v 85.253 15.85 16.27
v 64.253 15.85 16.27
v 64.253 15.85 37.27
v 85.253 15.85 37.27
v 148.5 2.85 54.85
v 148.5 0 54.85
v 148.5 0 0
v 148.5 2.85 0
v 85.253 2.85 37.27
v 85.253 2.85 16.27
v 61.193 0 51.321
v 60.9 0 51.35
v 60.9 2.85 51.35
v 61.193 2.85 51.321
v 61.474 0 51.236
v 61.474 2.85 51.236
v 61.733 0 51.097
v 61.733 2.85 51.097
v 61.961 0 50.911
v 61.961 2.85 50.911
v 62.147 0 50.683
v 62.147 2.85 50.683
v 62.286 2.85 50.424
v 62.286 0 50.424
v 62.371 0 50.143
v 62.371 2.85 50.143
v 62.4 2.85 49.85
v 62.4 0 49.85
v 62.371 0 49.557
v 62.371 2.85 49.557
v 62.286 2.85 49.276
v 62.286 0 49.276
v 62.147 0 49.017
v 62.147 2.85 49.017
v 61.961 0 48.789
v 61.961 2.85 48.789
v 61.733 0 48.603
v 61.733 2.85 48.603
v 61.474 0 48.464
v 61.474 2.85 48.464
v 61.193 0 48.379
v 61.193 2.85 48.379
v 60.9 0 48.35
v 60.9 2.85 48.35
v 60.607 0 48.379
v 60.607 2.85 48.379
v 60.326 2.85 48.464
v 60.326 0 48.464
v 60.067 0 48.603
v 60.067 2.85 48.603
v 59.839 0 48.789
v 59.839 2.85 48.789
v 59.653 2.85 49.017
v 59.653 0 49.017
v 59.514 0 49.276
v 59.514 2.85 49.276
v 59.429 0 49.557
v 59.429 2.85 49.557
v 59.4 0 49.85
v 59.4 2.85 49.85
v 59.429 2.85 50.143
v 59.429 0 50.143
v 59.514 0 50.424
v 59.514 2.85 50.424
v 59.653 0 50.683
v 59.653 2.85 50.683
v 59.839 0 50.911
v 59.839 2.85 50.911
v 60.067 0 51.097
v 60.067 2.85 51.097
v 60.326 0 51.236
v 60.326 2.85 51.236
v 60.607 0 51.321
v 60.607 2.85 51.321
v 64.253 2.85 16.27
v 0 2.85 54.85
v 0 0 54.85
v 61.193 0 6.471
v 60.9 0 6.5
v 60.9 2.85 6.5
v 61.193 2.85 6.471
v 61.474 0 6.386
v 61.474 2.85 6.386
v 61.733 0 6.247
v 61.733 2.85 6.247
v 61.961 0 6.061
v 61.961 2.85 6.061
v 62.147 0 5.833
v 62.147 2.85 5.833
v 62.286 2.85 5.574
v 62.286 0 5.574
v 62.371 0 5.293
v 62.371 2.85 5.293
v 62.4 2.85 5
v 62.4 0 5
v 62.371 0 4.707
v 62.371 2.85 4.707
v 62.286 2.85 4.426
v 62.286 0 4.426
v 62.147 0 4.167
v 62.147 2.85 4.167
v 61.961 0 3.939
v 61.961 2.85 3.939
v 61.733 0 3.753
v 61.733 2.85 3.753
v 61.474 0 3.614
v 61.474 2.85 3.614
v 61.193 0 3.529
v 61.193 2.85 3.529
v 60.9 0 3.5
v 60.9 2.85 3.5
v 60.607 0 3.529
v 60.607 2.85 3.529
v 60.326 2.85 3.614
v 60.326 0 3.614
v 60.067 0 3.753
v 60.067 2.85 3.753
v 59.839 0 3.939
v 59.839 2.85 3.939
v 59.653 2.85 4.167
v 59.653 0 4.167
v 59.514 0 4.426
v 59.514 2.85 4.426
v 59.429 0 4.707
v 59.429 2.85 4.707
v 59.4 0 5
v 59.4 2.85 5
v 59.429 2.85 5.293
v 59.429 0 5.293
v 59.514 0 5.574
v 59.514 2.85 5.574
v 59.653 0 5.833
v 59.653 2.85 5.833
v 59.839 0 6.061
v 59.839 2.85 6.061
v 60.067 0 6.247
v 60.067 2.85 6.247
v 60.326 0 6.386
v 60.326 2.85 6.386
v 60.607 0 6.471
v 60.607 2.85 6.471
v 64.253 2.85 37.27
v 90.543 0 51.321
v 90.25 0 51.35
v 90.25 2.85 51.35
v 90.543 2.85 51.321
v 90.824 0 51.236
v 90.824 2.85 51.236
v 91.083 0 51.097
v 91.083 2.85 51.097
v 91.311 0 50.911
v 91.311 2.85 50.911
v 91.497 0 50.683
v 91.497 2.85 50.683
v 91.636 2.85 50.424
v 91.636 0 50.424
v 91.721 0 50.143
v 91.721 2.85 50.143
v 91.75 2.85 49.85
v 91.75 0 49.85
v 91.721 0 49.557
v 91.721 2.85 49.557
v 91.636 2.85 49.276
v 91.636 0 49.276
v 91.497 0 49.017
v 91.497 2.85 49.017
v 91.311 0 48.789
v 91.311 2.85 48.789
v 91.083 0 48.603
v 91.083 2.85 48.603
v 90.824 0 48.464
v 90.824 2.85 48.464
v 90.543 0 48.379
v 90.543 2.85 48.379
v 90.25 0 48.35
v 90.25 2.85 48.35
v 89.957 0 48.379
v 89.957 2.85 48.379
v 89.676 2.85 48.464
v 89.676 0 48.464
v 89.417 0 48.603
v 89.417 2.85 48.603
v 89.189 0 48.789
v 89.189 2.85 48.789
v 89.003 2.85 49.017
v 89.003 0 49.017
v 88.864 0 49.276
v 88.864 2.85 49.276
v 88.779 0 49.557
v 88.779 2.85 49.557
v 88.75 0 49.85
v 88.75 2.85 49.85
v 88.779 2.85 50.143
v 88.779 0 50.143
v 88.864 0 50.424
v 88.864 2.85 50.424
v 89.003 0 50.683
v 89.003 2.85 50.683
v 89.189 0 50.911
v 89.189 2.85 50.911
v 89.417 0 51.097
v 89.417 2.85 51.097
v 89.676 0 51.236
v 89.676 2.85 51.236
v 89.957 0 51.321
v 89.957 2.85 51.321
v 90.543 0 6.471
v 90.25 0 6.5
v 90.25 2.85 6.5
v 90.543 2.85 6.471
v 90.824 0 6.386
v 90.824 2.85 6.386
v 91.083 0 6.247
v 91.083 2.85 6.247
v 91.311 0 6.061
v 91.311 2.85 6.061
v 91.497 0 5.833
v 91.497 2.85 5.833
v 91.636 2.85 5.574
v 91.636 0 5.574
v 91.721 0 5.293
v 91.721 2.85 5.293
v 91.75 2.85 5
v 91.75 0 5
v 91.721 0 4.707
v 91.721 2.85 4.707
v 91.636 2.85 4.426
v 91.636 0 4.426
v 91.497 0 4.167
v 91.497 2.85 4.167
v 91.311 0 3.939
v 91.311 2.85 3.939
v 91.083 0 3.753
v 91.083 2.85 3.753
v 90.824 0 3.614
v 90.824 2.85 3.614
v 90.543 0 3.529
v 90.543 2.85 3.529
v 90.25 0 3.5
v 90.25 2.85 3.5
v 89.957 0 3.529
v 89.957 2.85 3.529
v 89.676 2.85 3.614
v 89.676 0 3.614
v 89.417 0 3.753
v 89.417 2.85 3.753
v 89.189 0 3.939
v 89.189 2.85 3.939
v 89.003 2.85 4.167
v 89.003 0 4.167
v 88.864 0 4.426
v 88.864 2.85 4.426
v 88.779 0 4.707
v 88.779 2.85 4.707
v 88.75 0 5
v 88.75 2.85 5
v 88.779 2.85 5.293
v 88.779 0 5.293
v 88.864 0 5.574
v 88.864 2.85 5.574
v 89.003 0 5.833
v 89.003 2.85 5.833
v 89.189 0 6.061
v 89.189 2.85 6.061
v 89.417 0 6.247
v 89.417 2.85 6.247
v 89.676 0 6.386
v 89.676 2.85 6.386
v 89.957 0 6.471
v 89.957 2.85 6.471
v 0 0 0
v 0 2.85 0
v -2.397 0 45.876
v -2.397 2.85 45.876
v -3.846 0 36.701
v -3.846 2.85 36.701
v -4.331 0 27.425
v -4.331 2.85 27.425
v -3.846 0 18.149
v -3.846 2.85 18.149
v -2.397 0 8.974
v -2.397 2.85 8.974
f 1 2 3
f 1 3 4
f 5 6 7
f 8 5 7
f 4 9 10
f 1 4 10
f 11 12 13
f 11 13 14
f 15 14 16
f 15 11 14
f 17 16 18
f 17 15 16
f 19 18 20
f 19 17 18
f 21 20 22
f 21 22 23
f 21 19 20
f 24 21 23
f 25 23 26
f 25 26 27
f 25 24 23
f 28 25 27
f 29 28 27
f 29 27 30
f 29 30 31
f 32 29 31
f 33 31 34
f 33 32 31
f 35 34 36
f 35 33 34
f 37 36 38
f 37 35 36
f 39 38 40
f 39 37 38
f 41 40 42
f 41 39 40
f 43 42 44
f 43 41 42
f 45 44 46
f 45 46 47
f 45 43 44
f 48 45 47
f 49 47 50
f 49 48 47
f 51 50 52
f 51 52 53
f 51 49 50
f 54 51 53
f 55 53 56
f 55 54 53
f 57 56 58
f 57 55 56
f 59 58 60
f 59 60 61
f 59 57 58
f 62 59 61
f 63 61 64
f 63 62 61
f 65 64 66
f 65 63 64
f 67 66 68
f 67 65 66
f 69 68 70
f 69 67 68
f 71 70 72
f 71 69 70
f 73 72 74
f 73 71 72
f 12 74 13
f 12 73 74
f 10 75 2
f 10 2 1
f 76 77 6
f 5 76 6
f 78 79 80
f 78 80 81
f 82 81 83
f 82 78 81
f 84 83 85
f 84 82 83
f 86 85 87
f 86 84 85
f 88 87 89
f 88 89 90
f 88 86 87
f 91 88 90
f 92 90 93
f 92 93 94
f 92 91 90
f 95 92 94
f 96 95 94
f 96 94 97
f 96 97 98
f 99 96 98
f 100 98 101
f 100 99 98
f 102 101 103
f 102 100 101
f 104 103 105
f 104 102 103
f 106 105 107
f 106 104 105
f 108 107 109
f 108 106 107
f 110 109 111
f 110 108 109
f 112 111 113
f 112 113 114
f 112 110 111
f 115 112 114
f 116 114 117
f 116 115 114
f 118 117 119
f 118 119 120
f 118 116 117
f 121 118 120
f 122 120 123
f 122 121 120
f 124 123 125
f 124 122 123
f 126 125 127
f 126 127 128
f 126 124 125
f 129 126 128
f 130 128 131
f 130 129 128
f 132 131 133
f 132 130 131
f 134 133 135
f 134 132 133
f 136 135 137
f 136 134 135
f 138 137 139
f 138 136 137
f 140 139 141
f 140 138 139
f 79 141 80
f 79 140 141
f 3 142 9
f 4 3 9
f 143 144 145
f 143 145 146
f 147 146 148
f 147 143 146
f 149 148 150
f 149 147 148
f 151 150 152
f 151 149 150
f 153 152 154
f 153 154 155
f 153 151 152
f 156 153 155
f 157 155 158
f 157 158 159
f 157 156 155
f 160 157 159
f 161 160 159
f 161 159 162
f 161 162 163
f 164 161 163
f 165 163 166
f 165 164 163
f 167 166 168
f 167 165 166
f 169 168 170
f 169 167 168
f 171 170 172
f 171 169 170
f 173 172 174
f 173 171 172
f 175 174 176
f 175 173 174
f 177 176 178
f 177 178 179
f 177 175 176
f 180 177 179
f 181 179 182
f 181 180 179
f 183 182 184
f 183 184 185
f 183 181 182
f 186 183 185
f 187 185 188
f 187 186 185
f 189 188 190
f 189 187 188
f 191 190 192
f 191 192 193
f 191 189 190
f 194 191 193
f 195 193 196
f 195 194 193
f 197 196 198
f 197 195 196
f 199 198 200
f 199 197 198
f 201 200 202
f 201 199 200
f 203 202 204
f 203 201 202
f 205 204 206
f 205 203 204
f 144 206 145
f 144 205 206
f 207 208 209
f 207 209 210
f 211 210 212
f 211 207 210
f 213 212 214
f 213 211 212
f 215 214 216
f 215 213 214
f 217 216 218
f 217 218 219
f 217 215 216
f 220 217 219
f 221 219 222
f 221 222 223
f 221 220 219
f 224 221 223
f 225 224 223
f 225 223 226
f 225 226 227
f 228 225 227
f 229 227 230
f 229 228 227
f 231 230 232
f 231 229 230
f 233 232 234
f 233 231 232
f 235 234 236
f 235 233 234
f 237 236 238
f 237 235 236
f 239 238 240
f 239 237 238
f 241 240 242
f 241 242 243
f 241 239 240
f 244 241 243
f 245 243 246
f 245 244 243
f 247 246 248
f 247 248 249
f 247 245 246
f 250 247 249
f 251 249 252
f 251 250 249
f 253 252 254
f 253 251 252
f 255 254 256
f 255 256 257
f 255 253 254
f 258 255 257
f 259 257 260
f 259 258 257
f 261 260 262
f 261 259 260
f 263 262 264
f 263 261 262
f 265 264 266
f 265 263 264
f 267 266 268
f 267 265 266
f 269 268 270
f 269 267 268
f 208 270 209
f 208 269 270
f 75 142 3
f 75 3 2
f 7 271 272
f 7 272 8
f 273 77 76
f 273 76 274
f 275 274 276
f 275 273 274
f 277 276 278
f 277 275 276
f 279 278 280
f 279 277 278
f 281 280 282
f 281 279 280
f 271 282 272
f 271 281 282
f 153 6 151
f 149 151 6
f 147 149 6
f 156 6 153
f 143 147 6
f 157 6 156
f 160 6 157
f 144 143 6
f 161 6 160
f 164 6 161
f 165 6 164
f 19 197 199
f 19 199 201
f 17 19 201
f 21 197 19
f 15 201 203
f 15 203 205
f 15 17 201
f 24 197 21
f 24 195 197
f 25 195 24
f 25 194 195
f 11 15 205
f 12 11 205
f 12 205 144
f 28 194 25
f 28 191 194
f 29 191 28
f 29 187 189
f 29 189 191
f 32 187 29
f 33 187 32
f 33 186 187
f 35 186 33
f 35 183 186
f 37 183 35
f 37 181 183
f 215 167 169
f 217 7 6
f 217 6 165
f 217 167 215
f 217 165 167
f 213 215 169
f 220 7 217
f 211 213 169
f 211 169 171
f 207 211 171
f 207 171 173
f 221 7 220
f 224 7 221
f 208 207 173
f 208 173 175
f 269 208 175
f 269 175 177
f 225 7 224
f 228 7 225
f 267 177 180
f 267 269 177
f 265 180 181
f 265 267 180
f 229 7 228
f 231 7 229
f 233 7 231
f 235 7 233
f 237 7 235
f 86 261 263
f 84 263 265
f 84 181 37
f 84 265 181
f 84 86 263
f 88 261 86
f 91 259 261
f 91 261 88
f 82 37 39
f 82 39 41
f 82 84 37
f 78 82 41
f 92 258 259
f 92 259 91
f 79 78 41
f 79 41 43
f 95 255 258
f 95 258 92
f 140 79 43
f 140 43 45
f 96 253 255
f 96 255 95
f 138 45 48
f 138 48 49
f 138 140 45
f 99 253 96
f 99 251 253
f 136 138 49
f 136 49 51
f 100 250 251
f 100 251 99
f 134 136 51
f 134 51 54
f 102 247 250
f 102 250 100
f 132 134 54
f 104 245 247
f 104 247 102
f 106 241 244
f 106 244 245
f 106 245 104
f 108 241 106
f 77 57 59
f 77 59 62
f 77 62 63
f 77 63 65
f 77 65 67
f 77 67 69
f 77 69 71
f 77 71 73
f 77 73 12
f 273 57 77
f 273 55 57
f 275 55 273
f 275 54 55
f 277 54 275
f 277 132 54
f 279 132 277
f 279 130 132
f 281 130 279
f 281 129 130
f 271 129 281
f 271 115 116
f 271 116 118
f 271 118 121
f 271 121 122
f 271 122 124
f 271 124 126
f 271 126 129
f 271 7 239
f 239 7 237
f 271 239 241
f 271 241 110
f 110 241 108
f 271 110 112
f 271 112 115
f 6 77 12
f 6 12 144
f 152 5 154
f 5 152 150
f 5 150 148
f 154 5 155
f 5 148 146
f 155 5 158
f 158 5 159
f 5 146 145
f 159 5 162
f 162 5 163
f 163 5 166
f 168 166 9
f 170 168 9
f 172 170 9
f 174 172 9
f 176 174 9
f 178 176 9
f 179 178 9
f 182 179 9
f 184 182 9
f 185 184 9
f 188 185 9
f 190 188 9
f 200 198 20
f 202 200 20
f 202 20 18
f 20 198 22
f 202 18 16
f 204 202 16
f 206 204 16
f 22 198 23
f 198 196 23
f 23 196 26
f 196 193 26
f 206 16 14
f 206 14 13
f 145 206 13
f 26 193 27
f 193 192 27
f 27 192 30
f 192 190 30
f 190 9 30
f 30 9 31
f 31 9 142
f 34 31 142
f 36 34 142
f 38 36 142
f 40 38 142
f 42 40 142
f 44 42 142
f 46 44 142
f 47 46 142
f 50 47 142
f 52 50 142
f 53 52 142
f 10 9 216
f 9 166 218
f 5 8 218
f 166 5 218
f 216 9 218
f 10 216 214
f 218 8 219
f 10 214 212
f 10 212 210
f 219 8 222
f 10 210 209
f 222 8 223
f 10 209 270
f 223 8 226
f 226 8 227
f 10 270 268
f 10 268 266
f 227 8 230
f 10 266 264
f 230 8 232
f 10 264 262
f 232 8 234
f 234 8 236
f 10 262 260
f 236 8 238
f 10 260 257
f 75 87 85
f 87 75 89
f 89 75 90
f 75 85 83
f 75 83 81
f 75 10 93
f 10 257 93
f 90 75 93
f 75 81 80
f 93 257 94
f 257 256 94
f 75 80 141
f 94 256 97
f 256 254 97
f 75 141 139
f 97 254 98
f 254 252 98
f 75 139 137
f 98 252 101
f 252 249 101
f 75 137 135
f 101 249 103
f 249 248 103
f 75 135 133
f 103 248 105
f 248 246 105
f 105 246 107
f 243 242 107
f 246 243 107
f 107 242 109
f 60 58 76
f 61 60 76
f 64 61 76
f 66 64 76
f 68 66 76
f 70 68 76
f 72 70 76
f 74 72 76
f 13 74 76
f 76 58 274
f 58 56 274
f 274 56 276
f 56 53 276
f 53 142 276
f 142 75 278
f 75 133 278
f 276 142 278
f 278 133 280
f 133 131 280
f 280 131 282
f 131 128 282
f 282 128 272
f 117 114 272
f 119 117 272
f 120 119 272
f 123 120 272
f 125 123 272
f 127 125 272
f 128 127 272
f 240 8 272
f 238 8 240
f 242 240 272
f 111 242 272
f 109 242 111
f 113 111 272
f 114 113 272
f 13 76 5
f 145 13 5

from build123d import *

# Parameters (mm, degrees)
SKETCH1_W           = 148.5
SKETCH1_H           = 54.85
SKETCH1_R           = 1.5
BOSS_EXTRUDE1_DEPTH = 2.85
SKETCH2_W           = 21
SKETCH2_H           = 21
BOSS_EXTRUDE2_DEPTH = 13


with BuildPart() as part:
    # Sketch1 → Boss-Extrude1 (new body)
    # profile 1 of 2: a face of its own
    with BuildSketch(Plane(origin=(0, 0, 0), x_dir=(1, 0, 0), z_dir=(0, 1, 0))):
        with Locations((74.25, -27.425)):
            Rectangle(SKETCH1_W, SKETCH1_H)
        with Locations(Location((90.25, -5, 0), (0, 0, 270))):
            Circle(SKETCH1_R, mode=Mode.SUBTRACT)
        with Locations(Location((60.9, -5, 0), (0, 0, 270))):
            Circle(SKETCH1_R, mode=Mode.SUBTRACT)
        with Locations(Location((60.9, -49.85, 0), (0, 0, 270))):
            Circle(SKETCH1_R, mode=Mode.SUBTRACT)
        with Locations(Location((90.25, -49.85, 0), (0, 0, 270))):
            Circle(SKETCH1_R, mode=Mode.SUBTRACT)
    # profile 2 of 2: a face of its own
    with BuildSketch(Plane(origin=(0, 0, 0), x_dir=(1, 0, 0), z_dir=(0, 1, 0))):
        with BuildLine():
            Line((0, 0), (0, -54.85))
            ThreePointArc((0, -54.85), (-4.330823938, -27.425), (0, 0))
        make_face()
    extrude(amount=BOSS_EXTRUDE1_DEPTH)

    # Sketch2 → Boss-Extrude2 (add)
    with BuildSketch(Plane(origin=(0, 2.85, 0), x_dir=(1, 0, 0), z_dir=(0, 1, 0))):
        with Locations((74.75319094, -26.769521426)):
            Rectangle(SKETCH2_W, SKETCH2_H)
    extrude(amount=BOSS_EXTRUDE2_DEPTH)


solid = part.part
